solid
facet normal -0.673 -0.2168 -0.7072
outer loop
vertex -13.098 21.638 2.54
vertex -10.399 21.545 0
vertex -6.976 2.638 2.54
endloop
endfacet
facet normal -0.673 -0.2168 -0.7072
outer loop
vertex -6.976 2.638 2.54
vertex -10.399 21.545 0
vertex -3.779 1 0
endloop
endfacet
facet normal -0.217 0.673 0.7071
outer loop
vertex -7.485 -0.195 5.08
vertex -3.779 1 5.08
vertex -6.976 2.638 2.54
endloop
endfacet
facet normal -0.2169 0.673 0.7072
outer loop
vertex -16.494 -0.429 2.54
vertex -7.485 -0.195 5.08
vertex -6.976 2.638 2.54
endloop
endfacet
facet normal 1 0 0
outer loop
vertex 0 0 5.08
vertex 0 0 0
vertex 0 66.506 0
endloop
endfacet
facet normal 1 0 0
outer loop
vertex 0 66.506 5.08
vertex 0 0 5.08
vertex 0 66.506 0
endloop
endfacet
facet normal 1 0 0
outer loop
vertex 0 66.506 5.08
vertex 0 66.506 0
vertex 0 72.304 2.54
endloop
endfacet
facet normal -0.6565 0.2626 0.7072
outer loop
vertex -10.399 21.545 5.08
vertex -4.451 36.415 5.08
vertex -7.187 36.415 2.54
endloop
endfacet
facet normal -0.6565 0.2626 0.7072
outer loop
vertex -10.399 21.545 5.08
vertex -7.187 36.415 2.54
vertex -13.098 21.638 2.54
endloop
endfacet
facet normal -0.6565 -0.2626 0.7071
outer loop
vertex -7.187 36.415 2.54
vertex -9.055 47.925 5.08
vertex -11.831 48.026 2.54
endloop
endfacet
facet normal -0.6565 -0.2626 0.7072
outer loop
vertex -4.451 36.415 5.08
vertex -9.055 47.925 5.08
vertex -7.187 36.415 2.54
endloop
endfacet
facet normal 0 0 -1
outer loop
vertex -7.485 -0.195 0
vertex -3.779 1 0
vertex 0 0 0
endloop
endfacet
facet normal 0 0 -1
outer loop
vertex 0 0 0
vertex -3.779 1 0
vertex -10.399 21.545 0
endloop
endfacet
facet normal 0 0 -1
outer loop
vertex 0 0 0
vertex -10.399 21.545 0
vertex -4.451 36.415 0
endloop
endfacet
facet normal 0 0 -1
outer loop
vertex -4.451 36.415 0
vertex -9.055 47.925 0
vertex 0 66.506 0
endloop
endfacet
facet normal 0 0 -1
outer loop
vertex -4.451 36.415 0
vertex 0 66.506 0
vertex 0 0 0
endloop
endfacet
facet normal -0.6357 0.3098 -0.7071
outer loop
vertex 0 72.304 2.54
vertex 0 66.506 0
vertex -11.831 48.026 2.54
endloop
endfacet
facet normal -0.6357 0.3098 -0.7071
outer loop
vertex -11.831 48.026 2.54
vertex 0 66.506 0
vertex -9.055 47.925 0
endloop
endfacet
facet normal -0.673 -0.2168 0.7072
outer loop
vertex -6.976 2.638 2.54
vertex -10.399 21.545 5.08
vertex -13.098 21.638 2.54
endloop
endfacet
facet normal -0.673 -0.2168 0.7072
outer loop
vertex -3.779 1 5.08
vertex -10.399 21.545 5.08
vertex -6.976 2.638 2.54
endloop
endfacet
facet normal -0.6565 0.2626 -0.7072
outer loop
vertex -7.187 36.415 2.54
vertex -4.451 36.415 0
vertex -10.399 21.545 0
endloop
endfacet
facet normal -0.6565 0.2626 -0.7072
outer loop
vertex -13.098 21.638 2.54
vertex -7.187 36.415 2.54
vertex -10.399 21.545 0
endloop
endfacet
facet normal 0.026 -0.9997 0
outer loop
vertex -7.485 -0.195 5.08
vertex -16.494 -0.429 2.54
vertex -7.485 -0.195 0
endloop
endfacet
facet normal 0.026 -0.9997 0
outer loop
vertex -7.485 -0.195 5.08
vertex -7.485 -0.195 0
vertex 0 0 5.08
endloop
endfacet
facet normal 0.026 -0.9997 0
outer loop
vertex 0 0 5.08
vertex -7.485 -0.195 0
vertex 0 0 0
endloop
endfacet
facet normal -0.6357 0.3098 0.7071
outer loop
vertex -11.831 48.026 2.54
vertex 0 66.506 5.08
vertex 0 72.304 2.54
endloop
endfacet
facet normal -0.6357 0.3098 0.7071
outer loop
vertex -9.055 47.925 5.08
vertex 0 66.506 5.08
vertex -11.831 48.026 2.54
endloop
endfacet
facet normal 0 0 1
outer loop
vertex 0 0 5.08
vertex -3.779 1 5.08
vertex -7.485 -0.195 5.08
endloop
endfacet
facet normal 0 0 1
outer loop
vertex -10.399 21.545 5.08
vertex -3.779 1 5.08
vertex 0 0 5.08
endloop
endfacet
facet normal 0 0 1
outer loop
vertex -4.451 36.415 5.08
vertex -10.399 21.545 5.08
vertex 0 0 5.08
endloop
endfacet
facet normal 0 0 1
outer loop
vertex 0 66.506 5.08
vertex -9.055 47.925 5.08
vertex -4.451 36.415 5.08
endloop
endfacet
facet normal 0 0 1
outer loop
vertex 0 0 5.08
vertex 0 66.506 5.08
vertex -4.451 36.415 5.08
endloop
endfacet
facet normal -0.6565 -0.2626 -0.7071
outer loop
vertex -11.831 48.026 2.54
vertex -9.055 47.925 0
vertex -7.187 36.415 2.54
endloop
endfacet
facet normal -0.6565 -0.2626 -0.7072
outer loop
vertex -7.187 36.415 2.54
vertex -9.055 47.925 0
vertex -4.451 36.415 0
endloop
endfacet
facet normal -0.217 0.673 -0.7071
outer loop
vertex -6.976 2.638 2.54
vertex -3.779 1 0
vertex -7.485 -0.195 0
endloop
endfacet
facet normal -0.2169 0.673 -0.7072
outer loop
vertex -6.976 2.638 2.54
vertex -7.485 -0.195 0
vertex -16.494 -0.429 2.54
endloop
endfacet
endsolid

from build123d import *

# Parameters (mm, degrees)
F1_DEPTH = 5.08
F2_SIZE  = 2.53999


# Not quite as in the source:
# - a fillet or chamfer is up to 0.001 mm smaller than in the source, because OpenCascade refuses the exact size


with BuildPart() as f1:
    # F0 (on Top) → F1 (new body)
    with BuildSketch(Plane.XY):
        Polygon((0, 0), (0, 72.3038464785), (-11.8312668055, 48.0264090002), (-7.1868877858, 36.4154614508), (-13.0979157984, 21.6378867626), (-6.9757793099, 2.6381509379), (-16.4937096578, -0.428737424), align=None)
    extrude(amount=F1_DEPTH)

    # F2 (size 2.54 in the source; OpenCascade refuses exactly that, so slightly less here)
    f2_edges = [f1.edges().sort_by_distance(p)[0] for p in [
        (-5.915633, 60.165128, 5.08),
        (-9.509077, 42.220935, 5.08),
        (-10.142402, 29.026674, 5.08),
        (-10.036848, 12.138019, 5.08),
        (-11.734744, 1.104707, 5.08),
        (-5.915633, 60.165128, 0),
        (-9.509077, 42.220935, 0),
        (-10.142402, 29.026674, 0),
        (-10.036848, 12.138019, 0),
        (-11.734744, 1.104707, 0),
    ]]
    chamfer(f2_edges, length=F2_SIZE)


solid = f1.part
